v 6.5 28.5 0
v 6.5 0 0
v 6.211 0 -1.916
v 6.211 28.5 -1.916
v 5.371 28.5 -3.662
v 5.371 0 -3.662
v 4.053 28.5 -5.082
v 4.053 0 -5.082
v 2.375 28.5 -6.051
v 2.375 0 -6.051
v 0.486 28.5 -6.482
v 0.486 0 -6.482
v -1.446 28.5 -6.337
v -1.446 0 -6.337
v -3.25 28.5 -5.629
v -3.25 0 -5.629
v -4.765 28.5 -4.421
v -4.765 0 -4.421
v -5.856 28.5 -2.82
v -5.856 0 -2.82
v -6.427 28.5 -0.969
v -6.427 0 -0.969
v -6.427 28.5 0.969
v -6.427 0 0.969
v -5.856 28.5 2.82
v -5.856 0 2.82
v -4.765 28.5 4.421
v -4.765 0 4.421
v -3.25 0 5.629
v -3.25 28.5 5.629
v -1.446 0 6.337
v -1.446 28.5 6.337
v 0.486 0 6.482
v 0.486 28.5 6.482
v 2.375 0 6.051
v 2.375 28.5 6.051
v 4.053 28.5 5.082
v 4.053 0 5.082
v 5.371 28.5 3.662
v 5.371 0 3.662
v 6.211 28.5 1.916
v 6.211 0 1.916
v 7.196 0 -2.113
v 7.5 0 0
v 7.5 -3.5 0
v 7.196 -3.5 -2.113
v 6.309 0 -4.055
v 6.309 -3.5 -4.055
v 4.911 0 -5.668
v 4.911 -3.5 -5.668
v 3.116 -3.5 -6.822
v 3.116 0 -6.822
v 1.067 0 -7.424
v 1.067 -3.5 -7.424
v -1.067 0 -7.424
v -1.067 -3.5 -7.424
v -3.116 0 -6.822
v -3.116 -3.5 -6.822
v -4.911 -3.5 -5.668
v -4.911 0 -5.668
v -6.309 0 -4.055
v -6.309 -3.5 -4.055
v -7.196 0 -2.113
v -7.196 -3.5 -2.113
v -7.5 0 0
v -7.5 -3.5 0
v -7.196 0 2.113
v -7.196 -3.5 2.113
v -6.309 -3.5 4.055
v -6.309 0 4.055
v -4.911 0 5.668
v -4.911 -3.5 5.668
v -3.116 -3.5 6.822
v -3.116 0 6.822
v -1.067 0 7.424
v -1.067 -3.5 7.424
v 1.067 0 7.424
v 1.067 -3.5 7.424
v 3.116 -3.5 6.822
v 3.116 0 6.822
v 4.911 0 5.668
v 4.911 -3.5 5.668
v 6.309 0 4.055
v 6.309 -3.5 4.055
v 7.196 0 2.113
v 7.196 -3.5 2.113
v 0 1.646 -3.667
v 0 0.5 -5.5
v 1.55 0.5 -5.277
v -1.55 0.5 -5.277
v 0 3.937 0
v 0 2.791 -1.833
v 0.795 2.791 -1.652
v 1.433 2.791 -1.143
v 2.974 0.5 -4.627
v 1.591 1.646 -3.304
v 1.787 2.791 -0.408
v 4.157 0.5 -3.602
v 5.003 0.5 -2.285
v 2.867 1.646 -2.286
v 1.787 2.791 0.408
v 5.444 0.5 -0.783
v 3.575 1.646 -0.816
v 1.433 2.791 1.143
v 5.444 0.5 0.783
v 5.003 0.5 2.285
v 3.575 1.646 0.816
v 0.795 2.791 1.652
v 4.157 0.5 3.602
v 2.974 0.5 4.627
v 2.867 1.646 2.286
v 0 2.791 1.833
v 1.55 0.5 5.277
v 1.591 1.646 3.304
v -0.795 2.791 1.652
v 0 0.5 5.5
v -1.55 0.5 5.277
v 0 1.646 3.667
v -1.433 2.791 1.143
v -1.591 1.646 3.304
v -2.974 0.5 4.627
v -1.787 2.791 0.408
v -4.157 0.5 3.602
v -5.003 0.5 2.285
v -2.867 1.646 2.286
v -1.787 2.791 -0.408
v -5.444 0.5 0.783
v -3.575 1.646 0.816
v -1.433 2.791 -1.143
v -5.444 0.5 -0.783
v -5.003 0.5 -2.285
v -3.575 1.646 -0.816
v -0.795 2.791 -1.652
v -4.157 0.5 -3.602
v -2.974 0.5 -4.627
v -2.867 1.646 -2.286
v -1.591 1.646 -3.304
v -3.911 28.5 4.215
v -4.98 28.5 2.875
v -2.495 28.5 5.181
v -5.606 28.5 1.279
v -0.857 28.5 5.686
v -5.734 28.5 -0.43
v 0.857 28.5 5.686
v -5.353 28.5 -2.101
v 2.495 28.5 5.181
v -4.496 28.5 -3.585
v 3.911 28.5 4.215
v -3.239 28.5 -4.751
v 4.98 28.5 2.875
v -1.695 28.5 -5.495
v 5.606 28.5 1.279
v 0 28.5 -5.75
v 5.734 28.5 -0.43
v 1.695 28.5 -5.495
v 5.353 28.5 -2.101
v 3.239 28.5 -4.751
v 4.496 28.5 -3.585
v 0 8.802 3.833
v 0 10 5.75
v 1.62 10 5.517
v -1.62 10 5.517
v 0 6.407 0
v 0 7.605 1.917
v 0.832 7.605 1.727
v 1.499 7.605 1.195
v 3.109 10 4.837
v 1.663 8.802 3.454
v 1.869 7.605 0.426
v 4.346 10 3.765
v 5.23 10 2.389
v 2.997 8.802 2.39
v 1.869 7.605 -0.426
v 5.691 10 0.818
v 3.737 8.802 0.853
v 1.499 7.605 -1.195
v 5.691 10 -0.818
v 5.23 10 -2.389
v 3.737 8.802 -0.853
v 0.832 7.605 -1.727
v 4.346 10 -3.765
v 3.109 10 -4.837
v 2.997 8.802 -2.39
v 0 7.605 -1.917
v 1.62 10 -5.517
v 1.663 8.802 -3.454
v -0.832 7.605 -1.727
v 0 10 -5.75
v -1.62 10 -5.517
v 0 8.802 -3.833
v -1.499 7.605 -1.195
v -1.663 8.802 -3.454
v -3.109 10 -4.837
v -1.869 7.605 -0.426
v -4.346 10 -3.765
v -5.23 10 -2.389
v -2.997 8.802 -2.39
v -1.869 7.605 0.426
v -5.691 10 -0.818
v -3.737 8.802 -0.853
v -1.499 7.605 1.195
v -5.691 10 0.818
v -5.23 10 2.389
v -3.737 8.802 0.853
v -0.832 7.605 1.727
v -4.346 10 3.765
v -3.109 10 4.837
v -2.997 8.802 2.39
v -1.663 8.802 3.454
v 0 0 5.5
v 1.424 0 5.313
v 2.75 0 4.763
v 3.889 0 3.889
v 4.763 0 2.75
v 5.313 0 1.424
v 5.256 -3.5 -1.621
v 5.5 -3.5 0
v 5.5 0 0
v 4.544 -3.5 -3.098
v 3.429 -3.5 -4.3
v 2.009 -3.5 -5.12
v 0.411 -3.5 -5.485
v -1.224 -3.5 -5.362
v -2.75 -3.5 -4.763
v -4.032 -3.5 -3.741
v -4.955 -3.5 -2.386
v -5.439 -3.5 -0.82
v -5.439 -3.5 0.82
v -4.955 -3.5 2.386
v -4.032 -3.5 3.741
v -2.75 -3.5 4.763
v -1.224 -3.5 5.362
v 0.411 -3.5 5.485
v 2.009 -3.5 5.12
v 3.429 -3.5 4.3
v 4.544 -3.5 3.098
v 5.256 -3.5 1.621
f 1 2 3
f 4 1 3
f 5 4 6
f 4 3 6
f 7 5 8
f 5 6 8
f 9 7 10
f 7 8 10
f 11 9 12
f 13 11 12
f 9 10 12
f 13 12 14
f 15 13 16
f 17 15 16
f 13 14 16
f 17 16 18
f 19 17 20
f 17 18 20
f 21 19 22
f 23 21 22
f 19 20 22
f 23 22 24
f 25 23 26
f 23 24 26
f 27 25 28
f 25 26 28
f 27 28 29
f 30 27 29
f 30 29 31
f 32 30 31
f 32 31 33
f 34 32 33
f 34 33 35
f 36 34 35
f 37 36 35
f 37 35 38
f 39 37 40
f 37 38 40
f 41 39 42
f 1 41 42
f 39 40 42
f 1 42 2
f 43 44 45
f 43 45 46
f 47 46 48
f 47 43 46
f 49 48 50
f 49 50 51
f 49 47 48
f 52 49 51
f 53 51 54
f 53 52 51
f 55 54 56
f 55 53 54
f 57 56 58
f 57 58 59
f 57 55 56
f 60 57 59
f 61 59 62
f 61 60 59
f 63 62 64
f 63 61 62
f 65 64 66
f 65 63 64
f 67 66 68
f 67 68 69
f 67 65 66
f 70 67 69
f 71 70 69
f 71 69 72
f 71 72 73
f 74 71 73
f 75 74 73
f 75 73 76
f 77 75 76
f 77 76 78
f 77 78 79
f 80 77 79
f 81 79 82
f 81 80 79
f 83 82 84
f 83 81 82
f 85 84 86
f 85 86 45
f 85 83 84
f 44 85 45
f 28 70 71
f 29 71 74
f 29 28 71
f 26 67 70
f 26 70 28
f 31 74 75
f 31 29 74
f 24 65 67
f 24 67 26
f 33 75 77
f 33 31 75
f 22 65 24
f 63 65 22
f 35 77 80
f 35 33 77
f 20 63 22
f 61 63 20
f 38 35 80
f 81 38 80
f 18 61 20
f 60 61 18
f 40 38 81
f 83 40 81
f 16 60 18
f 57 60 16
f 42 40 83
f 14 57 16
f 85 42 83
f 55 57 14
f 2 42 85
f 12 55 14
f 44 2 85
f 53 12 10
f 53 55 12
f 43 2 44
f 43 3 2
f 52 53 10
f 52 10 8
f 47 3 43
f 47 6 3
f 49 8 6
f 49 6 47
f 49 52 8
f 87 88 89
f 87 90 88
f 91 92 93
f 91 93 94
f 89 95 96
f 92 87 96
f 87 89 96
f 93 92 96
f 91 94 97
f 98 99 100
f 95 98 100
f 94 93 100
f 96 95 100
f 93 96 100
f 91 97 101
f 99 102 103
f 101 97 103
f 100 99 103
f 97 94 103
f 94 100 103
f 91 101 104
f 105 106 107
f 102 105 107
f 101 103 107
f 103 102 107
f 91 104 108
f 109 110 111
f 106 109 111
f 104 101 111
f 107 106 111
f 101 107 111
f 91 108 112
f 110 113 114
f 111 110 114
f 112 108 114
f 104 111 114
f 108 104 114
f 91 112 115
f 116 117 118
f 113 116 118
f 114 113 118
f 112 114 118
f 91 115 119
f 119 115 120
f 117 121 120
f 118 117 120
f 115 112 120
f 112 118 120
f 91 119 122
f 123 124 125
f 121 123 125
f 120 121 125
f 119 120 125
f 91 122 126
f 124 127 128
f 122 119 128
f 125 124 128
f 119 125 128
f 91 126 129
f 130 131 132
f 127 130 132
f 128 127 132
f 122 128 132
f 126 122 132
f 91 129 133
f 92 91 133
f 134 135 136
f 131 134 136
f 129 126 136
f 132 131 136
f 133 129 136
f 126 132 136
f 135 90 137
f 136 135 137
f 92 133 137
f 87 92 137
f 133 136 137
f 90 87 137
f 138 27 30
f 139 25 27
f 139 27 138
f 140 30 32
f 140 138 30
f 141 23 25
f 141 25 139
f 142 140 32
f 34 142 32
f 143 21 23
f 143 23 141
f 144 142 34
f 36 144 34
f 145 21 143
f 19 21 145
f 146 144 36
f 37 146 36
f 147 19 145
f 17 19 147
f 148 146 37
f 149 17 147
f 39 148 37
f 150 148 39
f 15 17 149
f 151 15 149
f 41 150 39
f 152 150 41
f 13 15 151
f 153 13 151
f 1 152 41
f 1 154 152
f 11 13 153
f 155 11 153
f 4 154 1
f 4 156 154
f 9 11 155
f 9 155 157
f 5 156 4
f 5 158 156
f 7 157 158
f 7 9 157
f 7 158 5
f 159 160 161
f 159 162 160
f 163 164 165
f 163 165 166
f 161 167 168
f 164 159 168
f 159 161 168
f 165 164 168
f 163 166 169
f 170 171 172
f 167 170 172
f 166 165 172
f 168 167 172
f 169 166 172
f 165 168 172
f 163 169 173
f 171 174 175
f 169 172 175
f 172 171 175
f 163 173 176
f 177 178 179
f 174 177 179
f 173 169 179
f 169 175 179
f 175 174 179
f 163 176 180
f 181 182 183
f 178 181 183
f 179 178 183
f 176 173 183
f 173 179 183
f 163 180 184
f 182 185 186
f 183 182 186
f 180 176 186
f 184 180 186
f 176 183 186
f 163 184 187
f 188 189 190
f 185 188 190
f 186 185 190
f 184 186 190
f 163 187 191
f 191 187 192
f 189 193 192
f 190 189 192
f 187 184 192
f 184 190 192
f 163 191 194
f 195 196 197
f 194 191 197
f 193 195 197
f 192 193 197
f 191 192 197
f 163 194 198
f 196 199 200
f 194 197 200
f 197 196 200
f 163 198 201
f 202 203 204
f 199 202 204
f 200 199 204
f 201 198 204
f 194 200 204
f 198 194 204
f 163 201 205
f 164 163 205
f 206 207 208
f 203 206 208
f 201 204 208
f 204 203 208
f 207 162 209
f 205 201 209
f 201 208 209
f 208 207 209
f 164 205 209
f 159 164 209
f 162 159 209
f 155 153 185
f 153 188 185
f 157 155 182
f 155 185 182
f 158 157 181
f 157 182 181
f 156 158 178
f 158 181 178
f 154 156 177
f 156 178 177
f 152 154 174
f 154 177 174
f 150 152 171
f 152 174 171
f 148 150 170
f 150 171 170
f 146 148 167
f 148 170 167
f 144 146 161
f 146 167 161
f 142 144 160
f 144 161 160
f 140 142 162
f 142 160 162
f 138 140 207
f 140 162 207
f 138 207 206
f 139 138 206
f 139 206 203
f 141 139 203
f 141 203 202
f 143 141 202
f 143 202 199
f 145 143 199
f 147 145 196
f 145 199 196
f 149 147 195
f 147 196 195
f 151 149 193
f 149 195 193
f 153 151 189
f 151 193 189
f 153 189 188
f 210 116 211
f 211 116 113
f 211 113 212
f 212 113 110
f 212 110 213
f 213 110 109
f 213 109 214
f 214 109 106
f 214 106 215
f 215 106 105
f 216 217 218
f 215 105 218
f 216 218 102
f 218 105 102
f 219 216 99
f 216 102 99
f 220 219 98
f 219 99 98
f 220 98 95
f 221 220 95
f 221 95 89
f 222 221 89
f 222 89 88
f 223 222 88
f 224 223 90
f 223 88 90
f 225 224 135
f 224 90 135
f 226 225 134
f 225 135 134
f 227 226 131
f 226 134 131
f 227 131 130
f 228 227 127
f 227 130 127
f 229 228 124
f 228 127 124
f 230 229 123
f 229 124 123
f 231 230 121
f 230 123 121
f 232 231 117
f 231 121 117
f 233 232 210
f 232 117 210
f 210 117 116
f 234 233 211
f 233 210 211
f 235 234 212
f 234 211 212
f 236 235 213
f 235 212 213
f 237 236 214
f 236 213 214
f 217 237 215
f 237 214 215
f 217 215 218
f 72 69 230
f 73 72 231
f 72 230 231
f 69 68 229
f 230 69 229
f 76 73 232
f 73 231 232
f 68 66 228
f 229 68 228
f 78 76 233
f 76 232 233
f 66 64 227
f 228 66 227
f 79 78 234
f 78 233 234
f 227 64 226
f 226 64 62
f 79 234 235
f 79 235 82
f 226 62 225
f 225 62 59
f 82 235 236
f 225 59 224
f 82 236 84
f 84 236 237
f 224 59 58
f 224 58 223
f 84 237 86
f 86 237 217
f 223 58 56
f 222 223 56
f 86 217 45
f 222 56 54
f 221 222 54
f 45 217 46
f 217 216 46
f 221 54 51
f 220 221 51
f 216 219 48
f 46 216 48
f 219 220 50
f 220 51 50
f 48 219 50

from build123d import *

# Parameters (mm, degrees)
SKETCH5_R                        = 7.5
SKETCH5_R_2                      = 5.5
EXTRUDE_THIN5_DEPTH              = 3.5
SKETCH6_R                        = 6.5
BOSS_EXTRUDE1_DEPTH              = 28.5
F_11_5_11_5_DIAMETER_HOLE1_D     = 11.5
F_11_5_11_5_DIAMETER_HOLE1_DEPTH = 18.5
F_11_5_11_5_DIAMETER_HOLE1_TIP   = 3.592998773
F_11_0_11_DIAMETER_HOLE2_D       = 11
F_11_0_11_DIAMETER_HOLE2_DEPTH   = 4
F_11_0_11_DIAMETER_HOLE2_TIP     = 3.436781436


with BuildPart() as part:
    # Sketch5 → Extrude-Thin5 (new body)
    with BuildSketch(Plane(origin=(0, 0, 0), x_dir=(1, 0, 0), z_dir=(0, 1, 0))):
        Circle(SKETCH5_R)
        Circle(SKETCH5_R_2, mode=Mode.SUBTRACT)
    extrude(amount=-EXTRUDE_THIN5_DEPTH)

    # Sketch6 → Boss-Extrude1 (add)
    with BuildSketch(Plane(origin=(0, 0, 0), x_dir=(1, 0, 0), z_dir=(0, 1, 0))):
        Circle(SKETCH6_R)
    extrude(amount=BOSS_EXTRUDE1_DEPTH)

    # Ø11.5 (11.5) Diameter Hole1
    with Locations(Plane.ZX.offset(28.5)):
        with Locations((0, 0)):
            Hole(F_11_5_11_5_DIAMETER_HOLE1_D / 2, depth=F_11_5_11_5_DIAMETER_HOLE1_DEPTH)
            with Locations((0, 0, -(F_11_5_11_5_DIAMETER_HOLE1_DEPTH + F_11_5_11_5_DIAMETER_HOLE1_TIP / 2))):  # 116° drill point
                Cone(0, F_11_5_11_5_DIAMETER_HOLE1_D / 2, F_11_5_11_5_DIAMETER_HOLE1_TIP, mode=Mode.SUBTRACT)

    # Ø11.0 (11) Diameter Hole2
    with Locations(Plane(origin=(0, -3.5, 0), x_dir=(0, 0, -1), z_dir=(0, -1, 0))):
        with Locations((0, 0)):
            Hole(F_11_0_11_DIAMETER_HOLE2_D / 2, depth=F_11_0_11_DIAMETER_HOLE2_DEPTH)
            with Locations((0, 0, -(F_11_0_11_DIAMETER_HOLE2_DEPTH + F_11_0_11_DIAMETER_HOLE2_TIP / 2))):  # 116° drill point
                Cone(0, F_11_0_11_DIAMETER_HOLE2_D / 2, F_11_0_11_DIAMETER_HOLE2_TIP, mode=Mode.SUBTRACT)


solid = part.part
